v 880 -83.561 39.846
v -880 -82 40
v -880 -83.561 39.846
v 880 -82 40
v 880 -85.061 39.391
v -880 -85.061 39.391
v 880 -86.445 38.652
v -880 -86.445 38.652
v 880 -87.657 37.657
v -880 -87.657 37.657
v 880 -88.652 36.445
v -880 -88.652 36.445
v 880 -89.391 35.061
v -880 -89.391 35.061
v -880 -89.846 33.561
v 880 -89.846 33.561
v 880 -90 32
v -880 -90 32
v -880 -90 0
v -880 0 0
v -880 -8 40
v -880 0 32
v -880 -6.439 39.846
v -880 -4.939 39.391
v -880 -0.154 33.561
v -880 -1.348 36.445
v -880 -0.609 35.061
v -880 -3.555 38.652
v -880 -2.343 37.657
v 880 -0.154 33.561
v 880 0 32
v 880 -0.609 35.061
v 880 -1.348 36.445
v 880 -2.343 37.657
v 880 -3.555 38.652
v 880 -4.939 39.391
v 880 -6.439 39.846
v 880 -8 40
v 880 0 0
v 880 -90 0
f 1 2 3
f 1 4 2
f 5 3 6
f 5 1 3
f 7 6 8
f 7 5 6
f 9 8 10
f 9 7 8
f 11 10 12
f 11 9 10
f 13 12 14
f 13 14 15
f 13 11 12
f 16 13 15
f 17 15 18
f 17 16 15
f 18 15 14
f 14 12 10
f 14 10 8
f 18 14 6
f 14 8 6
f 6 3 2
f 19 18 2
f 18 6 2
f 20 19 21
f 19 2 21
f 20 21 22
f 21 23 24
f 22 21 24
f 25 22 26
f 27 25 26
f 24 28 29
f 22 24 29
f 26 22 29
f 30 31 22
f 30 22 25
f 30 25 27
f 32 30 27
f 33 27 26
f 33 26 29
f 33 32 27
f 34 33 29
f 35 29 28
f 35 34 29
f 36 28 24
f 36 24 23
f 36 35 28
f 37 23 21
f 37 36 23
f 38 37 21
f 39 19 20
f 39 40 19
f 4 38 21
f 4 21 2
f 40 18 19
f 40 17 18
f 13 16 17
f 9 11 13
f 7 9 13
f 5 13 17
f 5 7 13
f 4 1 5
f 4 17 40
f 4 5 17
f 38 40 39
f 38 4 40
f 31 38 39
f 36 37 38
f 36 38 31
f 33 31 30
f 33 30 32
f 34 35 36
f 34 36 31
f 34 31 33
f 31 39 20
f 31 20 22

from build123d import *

# Parameters (mm, degrees)
F1_DEPTH = 880


with BuildPart() as f1:
    # F0 (on Right) → F1 (new body, symmetric)
    with BuildSketch(Plane.YZ):
        with BuildLine():
            Line((-90, 0), (0, 0))
            Line((0, 0), (0, 32))
            ThreePointArc((0, 32), (-2.343146, 37.656854), (-8, 40))
            Line((-8, 40), (-82, 40))
            ThreePointArc((-82, 40), (-87.656854, 37.656854), (-90, 32))
            Line((-90, 32), (-90, 0))
        make_face()
    extrude(amount=F1_DEPTH, both=True)


solid = f1.part
